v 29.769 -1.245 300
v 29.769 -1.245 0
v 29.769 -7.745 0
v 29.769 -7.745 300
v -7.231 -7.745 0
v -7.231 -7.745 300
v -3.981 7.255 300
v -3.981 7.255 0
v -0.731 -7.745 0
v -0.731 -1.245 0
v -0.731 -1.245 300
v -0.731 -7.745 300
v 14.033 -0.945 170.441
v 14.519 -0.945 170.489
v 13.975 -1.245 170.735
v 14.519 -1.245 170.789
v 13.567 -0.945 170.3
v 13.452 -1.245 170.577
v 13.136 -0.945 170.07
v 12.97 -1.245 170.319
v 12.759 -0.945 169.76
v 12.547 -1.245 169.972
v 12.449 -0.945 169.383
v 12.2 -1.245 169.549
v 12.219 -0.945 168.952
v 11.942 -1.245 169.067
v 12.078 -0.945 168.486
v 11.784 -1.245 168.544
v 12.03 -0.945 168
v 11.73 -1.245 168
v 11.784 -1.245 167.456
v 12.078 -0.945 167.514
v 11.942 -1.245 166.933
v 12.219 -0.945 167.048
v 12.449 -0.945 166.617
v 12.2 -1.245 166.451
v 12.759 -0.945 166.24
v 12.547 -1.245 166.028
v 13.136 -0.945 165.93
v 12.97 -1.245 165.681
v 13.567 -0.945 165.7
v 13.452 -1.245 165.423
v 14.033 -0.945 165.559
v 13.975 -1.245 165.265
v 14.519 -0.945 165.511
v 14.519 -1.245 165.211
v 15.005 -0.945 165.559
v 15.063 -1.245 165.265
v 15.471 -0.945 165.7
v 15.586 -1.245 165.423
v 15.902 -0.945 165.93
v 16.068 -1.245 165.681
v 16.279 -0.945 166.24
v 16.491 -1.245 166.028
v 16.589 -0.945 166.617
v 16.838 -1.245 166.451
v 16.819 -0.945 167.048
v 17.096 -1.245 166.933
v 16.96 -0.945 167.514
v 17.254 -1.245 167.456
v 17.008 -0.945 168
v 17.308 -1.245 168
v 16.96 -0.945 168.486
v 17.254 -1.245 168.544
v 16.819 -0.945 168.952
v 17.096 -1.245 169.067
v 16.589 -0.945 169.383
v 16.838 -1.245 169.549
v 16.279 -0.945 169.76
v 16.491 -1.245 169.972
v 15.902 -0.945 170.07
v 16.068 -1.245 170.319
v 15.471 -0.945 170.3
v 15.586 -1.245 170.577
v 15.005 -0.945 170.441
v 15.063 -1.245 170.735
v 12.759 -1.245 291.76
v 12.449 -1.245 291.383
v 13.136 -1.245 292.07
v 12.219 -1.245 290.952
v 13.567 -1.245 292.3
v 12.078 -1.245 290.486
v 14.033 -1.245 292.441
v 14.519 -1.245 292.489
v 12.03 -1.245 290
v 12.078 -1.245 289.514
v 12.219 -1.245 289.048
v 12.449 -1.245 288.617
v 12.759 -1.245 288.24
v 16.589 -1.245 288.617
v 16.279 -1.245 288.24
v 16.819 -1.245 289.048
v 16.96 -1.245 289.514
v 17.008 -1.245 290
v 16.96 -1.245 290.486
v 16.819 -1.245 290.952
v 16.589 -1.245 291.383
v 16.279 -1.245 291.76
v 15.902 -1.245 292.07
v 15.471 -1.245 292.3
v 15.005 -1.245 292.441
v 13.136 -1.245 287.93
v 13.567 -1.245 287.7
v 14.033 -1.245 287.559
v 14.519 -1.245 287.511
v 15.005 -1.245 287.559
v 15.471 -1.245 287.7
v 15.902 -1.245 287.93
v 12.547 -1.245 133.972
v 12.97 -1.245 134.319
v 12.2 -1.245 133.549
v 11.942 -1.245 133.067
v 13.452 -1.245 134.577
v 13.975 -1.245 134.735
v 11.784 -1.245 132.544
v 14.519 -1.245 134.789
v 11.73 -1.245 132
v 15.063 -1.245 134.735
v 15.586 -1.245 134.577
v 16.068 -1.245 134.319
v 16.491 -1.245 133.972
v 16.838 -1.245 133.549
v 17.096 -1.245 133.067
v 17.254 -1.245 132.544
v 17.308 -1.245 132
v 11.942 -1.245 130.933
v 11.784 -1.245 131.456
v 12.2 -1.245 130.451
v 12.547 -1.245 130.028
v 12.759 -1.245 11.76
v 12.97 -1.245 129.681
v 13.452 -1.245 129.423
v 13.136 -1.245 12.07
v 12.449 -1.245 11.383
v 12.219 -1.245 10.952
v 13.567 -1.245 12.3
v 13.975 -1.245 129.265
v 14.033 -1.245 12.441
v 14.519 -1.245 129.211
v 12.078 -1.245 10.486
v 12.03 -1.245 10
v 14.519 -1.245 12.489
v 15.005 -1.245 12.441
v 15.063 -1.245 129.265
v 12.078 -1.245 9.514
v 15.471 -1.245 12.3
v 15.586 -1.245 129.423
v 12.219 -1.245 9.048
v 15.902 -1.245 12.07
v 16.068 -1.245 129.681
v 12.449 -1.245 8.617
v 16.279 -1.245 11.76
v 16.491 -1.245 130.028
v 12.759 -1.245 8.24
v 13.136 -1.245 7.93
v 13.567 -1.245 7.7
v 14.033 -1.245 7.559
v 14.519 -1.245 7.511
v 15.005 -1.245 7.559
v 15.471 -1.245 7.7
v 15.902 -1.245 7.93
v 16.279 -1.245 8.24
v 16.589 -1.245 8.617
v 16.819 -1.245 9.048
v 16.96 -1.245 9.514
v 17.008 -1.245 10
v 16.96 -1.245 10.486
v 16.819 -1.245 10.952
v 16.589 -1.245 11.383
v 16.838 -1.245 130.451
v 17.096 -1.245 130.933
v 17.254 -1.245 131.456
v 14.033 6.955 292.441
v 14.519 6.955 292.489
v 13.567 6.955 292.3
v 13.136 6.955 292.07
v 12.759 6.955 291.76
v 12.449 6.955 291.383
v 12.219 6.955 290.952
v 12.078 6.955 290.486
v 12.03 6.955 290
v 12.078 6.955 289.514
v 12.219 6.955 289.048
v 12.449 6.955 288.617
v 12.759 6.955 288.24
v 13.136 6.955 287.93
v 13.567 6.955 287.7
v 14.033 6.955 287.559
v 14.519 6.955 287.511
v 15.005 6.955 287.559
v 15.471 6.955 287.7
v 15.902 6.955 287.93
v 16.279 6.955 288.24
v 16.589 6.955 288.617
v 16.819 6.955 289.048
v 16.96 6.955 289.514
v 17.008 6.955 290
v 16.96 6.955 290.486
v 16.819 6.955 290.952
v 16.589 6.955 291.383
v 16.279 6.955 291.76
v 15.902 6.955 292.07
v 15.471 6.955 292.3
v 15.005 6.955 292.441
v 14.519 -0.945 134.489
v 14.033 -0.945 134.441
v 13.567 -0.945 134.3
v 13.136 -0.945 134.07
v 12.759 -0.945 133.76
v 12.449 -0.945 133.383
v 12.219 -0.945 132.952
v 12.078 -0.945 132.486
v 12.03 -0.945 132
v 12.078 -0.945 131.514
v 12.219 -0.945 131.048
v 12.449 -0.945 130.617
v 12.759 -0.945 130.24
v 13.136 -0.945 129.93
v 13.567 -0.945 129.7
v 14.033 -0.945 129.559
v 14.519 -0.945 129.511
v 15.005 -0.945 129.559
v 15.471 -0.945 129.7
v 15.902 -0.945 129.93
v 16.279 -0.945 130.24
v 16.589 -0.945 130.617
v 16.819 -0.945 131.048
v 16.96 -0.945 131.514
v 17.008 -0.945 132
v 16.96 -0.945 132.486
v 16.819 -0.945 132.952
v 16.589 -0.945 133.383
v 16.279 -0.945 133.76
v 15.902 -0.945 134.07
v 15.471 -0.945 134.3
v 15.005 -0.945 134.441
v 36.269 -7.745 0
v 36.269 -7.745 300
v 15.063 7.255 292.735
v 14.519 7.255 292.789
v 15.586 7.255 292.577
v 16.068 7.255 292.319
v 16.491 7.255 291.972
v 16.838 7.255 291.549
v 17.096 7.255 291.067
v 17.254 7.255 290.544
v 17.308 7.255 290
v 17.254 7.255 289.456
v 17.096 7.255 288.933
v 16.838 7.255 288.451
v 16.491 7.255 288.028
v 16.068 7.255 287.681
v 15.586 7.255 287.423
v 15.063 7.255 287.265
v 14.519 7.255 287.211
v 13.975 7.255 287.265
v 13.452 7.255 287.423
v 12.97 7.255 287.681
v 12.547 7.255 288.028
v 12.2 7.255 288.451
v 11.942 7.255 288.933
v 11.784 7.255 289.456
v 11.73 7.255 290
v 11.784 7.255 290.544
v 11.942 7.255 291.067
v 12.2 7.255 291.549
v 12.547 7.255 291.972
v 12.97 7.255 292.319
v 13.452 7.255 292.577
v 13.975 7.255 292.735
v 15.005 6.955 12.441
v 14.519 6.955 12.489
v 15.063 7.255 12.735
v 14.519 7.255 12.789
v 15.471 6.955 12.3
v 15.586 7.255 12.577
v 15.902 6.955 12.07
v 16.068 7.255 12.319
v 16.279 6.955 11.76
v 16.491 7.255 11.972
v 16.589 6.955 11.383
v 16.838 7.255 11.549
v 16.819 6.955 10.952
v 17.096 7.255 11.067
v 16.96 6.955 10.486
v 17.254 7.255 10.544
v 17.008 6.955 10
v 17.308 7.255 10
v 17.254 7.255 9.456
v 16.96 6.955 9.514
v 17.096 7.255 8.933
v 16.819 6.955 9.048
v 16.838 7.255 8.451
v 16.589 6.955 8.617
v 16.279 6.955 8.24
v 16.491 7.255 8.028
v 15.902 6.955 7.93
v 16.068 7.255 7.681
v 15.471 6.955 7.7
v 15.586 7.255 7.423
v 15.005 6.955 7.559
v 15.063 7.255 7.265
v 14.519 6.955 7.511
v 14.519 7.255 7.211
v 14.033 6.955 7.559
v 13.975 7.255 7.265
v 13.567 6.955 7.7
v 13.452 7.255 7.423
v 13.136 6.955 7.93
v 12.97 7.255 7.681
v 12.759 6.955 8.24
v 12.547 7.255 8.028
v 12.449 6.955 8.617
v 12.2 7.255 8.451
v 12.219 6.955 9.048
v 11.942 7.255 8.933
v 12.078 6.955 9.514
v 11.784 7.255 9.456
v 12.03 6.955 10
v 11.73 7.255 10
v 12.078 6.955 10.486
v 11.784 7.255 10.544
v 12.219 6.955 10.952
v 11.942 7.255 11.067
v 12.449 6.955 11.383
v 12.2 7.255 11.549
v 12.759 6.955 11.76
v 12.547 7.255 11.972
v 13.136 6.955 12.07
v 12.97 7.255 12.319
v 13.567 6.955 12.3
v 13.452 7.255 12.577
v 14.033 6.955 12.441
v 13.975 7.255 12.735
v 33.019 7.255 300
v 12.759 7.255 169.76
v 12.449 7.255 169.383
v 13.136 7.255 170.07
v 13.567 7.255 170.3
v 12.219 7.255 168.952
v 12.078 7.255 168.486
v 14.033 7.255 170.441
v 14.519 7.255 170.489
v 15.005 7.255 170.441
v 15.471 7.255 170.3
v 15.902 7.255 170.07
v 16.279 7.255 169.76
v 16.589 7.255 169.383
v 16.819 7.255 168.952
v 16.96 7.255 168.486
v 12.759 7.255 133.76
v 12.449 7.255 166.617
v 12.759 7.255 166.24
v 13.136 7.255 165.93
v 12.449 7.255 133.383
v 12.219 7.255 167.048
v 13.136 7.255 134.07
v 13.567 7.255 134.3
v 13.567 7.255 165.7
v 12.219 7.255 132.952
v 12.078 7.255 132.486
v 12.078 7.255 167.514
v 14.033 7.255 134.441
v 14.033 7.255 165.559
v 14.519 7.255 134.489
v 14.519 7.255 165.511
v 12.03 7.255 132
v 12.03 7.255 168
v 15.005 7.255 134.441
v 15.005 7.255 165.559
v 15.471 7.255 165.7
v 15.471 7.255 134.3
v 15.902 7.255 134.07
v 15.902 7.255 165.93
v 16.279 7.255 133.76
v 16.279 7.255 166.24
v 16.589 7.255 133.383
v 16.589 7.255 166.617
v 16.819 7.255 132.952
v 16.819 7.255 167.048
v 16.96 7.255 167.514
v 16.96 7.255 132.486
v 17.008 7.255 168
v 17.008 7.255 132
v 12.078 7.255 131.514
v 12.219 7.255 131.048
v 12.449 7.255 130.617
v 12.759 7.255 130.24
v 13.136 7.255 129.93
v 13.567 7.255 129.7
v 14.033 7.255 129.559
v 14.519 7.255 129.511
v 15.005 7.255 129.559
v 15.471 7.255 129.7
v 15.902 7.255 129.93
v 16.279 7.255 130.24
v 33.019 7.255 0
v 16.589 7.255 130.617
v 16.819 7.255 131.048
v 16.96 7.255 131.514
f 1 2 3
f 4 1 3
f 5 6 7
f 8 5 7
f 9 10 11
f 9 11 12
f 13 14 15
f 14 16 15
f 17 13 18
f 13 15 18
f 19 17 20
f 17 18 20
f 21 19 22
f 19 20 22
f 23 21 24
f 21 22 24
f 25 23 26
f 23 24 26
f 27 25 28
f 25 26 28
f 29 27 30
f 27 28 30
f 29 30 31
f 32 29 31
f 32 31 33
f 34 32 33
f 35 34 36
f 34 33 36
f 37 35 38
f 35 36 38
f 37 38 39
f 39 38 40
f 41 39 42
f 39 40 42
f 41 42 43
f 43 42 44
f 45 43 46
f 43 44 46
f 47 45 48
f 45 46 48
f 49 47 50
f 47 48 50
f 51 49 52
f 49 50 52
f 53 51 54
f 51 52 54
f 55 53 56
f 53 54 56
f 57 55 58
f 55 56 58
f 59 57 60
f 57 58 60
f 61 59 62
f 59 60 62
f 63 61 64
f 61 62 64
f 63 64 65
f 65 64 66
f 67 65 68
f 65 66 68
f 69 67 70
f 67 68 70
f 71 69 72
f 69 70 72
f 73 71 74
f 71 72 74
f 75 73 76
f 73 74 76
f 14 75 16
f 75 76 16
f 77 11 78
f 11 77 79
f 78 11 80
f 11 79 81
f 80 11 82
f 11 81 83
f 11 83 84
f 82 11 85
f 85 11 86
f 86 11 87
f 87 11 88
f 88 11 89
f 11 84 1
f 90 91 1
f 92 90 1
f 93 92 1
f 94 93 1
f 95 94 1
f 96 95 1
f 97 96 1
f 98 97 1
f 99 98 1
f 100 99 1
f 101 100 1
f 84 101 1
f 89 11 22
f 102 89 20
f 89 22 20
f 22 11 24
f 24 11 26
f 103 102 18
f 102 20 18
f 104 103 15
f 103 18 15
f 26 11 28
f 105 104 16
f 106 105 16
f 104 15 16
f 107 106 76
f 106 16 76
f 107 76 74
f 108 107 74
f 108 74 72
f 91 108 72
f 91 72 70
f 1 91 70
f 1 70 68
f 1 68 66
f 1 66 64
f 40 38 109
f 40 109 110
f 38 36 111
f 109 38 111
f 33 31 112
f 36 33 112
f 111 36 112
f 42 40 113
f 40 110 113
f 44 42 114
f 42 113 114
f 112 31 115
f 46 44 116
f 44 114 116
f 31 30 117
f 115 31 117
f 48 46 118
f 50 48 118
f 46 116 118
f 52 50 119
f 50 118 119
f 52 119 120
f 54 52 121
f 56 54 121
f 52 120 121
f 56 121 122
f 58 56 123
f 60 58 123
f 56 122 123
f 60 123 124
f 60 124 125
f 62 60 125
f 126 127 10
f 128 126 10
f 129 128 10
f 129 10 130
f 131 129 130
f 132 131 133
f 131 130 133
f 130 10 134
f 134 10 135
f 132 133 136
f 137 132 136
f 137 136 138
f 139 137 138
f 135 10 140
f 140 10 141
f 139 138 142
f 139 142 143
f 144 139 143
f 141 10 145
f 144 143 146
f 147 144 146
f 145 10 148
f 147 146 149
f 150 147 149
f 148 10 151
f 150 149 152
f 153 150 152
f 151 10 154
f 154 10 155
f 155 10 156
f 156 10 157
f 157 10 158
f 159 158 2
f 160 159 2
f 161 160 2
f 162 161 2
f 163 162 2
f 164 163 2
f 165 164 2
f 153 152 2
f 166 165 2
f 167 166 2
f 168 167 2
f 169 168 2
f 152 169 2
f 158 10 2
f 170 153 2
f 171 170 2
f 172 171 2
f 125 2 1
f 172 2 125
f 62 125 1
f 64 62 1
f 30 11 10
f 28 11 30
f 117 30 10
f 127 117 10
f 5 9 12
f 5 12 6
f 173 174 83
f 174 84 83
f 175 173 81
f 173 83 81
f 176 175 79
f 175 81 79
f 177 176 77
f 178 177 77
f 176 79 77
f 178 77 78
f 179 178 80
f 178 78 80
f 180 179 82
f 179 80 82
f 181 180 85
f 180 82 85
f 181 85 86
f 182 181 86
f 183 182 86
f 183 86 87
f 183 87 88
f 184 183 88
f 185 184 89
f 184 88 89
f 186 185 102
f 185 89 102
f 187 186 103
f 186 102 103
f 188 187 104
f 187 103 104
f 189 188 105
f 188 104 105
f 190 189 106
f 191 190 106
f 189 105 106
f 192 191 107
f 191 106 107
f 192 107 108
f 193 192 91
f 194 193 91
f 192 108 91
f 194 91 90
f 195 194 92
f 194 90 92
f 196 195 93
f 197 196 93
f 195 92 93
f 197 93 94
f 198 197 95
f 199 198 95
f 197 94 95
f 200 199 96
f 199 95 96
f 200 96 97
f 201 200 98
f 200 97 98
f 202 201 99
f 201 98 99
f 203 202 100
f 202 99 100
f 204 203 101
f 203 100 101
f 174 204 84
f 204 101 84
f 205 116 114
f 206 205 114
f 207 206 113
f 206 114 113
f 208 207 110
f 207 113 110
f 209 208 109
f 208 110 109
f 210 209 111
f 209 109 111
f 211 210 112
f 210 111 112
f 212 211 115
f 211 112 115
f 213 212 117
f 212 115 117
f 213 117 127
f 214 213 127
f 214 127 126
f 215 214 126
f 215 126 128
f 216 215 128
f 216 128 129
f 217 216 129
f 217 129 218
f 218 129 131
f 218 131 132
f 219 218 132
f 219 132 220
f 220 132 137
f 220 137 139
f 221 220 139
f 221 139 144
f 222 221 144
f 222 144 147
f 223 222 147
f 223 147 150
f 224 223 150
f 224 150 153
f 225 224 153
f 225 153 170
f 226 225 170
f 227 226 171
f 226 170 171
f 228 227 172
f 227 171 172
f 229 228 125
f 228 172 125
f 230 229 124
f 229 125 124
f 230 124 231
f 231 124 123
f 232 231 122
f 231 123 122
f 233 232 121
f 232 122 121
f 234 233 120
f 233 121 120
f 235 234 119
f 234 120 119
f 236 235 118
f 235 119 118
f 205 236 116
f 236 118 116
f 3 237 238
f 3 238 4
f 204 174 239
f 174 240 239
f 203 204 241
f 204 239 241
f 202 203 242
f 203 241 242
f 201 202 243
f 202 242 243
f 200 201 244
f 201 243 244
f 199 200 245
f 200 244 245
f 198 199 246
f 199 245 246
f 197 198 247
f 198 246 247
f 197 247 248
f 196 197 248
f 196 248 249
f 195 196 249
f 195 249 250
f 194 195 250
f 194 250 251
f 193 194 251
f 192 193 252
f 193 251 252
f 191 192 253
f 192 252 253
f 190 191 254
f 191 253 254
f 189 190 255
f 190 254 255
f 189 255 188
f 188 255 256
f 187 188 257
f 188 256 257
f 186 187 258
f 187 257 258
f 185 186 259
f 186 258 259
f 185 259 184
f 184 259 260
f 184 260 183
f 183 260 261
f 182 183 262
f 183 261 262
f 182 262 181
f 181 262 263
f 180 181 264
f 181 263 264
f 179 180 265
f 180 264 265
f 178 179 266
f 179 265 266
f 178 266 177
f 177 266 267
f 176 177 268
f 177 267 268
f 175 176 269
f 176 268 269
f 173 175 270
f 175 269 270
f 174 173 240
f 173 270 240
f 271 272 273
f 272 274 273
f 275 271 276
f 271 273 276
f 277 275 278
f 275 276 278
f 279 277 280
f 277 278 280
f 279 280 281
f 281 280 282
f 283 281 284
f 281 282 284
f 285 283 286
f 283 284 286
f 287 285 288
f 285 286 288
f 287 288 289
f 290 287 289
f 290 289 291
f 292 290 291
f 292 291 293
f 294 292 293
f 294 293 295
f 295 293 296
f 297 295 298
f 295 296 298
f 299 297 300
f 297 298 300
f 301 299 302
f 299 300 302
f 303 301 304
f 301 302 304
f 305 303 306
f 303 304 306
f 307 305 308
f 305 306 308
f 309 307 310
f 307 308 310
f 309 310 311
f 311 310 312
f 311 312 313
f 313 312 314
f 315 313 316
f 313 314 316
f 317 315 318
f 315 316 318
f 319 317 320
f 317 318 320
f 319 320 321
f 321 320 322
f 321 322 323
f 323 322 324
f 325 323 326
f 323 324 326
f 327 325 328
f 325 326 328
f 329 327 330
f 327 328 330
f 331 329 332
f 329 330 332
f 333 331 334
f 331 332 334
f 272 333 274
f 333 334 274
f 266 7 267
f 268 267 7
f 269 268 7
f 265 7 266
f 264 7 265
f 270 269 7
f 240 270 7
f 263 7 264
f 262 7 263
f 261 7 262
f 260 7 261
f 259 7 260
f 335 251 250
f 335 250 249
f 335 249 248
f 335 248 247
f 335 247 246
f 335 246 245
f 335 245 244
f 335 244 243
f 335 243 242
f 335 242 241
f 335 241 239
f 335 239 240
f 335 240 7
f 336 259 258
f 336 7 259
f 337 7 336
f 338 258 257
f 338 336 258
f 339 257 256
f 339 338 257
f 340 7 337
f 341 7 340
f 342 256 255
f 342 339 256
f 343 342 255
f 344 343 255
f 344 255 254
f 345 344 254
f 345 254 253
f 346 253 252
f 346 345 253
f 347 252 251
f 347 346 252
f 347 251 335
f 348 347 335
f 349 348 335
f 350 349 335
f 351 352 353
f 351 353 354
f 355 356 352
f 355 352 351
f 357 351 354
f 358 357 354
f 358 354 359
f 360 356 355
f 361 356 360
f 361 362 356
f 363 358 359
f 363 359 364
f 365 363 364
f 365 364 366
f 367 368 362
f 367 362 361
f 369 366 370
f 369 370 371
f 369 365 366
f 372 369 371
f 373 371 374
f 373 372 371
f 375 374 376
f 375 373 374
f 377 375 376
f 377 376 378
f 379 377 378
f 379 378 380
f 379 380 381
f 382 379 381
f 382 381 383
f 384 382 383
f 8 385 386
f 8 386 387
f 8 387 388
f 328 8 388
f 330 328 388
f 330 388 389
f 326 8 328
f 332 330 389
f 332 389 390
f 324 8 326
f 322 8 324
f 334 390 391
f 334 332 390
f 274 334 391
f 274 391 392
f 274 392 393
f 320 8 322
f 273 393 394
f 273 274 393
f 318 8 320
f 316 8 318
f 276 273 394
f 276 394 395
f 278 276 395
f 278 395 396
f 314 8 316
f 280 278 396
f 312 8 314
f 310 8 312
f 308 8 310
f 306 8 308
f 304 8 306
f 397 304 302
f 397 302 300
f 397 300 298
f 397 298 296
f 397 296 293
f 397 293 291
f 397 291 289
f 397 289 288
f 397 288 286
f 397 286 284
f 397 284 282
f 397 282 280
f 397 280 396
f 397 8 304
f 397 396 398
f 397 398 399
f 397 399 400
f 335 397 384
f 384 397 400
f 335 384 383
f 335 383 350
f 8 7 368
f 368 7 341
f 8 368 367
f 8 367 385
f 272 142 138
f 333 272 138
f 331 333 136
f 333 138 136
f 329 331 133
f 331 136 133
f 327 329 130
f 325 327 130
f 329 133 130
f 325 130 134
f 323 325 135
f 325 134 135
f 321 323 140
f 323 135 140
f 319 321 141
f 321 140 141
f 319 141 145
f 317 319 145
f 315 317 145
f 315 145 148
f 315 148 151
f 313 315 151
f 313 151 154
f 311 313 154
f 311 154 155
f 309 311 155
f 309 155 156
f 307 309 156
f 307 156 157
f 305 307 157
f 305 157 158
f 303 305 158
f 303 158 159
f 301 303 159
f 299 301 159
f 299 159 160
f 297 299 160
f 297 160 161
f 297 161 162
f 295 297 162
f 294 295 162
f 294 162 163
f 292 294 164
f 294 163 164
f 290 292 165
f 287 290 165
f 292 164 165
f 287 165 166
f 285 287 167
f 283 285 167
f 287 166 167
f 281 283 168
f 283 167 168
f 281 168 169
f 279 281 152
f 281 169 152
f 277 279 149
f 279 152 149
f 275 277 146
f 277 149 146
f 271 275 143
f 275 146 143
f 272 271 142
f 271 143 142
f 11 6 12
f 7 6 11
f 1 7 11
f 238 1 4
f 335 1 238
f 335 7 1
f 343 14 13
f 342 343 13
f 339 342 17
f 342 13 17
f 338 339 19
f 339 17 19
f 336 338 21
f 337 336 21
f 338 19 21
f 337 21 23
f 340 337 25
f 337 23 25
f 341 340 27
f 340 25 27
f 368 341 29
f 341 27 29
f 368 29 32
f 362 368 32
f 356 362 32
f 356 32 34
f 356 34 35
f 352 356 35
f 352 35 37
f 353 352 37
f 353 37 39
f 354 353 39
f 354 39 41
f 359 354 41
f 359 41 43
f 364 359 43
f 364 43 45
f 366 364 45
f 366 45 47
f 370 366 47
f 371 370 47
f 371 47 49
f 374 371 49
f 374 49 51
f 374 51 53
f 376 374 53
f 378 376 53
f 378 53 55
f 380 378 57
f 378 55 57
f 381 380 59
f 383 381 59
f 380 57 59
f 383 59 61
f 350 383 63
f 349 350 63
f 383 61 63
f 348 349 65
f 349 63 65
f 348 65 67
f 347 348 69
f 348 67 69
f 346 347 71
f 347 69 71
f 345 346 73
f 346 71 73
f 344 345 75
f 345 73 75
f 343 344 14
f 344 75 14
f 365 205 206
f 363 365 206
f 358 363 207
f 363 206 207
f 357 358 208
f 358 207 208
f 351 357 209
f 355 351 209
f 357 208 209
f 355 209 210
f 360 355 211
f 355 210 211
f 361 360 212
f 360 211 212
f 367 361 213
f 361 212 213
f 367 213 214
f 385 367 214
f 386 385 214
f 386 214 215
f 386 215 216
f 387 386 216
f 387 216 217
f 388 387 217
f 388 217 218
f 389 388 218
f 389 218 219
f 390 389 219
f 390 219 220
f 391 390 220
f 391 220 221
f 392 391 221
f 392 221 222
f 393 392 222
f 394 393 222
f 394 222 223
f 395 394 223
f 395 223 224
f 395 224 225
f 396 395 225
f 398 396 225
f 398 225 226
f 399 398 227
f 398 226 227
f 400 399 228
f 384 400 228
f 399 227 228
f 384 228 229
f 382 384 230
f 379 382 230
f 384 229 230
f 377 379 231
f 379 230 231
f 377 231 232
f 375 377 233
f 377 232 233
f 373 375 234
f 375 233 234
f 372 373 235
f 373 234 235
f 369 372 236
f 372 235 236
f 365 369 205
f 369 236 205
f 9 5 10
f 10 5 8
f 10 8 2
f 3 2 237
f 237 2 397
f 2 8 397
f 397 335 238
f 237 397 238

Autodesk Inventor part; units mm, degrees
ref_plane "YZ Plane" through (0, 0, 0) normal (1, 0, 0) x (0, 1, 0)
ref_plane "XZ Plane" through (0, 0, 0) normal (0, 1, 0) x (-1, 0, 0)
ref_plane "XY Plane" through (0, 0, 0) normal (0, 0, 1) x (1, 0, 0)
sketch "Sketch1" plane through (0, 0, 0) normal (0, 0, 1) x (1, 0, 0)
  line L0 (-3.981, 7.2547) -> (33.019, 7.2547)
  line L1 (33.019, 7.2547) -> (36.269, -7.7453)
  line L2 (-7.231, -7.7453) -> (-3.981, 7.2547)
  line L3 (-0.731, -1.2453) -> (29.769, -1.2453)
  line L4 (29.769, -1.2453) -> (29.769, -7.7453)
  line L5 (-0.731, -1.2453) -> (-0.731, -7.7453)
  line L6 (36.269, -7.7453) -> (29.769, -7.7453)
  line L7 (-0.731, -7.7453) -> (-7.231, -7.7453)
  point P0 (0, 0)
  dimension "d0" = 37
  dimension "d1" = 43.5
  dimension "d4" = 30.5
extrude "Extrusion1" add sketch "Sketch1" along normal blind 300
sketch "Sketch2" plane through (-3.981, 7.2547, 0) normal (0, 1, 0) x (1, 0, 0)
  line L0 (37, -300) -> (0, -300) projected
  line L1 (0, 0) -> (37, 0) projected
  point P0 (3.981, 0)
  point P1 (18.5, -10)
  point P2 (18.5, -132)
  point P3 (18.5, -168)
  point P4 (18.5, -290)
  dimension "d9" = 10
  dimension "d10" = 10
  dimension "d11" = 36
hole "Hole1" at (14.519, 7.2547, 10) at (14.519, 7.2547, 132) at (14.519, 7.2547, 168) at (14.519, 7.2547, 290) direction (0, -1, 0) diameter 4.978 end through all thread size "1/4-20 UNC" class "2B" standard "ANSI Unified Screw Threads"
chamfer "Chamfer1" distance 0.3 angle 45 4 edges at (14.519, 7.2547, 287.511) (14.519, 7.2547, 7.511) (14.519, -1.2453, 129.511) (14.519, -1.2453, 165.511)
properties part number "szyna" material "Stainless Steel"
